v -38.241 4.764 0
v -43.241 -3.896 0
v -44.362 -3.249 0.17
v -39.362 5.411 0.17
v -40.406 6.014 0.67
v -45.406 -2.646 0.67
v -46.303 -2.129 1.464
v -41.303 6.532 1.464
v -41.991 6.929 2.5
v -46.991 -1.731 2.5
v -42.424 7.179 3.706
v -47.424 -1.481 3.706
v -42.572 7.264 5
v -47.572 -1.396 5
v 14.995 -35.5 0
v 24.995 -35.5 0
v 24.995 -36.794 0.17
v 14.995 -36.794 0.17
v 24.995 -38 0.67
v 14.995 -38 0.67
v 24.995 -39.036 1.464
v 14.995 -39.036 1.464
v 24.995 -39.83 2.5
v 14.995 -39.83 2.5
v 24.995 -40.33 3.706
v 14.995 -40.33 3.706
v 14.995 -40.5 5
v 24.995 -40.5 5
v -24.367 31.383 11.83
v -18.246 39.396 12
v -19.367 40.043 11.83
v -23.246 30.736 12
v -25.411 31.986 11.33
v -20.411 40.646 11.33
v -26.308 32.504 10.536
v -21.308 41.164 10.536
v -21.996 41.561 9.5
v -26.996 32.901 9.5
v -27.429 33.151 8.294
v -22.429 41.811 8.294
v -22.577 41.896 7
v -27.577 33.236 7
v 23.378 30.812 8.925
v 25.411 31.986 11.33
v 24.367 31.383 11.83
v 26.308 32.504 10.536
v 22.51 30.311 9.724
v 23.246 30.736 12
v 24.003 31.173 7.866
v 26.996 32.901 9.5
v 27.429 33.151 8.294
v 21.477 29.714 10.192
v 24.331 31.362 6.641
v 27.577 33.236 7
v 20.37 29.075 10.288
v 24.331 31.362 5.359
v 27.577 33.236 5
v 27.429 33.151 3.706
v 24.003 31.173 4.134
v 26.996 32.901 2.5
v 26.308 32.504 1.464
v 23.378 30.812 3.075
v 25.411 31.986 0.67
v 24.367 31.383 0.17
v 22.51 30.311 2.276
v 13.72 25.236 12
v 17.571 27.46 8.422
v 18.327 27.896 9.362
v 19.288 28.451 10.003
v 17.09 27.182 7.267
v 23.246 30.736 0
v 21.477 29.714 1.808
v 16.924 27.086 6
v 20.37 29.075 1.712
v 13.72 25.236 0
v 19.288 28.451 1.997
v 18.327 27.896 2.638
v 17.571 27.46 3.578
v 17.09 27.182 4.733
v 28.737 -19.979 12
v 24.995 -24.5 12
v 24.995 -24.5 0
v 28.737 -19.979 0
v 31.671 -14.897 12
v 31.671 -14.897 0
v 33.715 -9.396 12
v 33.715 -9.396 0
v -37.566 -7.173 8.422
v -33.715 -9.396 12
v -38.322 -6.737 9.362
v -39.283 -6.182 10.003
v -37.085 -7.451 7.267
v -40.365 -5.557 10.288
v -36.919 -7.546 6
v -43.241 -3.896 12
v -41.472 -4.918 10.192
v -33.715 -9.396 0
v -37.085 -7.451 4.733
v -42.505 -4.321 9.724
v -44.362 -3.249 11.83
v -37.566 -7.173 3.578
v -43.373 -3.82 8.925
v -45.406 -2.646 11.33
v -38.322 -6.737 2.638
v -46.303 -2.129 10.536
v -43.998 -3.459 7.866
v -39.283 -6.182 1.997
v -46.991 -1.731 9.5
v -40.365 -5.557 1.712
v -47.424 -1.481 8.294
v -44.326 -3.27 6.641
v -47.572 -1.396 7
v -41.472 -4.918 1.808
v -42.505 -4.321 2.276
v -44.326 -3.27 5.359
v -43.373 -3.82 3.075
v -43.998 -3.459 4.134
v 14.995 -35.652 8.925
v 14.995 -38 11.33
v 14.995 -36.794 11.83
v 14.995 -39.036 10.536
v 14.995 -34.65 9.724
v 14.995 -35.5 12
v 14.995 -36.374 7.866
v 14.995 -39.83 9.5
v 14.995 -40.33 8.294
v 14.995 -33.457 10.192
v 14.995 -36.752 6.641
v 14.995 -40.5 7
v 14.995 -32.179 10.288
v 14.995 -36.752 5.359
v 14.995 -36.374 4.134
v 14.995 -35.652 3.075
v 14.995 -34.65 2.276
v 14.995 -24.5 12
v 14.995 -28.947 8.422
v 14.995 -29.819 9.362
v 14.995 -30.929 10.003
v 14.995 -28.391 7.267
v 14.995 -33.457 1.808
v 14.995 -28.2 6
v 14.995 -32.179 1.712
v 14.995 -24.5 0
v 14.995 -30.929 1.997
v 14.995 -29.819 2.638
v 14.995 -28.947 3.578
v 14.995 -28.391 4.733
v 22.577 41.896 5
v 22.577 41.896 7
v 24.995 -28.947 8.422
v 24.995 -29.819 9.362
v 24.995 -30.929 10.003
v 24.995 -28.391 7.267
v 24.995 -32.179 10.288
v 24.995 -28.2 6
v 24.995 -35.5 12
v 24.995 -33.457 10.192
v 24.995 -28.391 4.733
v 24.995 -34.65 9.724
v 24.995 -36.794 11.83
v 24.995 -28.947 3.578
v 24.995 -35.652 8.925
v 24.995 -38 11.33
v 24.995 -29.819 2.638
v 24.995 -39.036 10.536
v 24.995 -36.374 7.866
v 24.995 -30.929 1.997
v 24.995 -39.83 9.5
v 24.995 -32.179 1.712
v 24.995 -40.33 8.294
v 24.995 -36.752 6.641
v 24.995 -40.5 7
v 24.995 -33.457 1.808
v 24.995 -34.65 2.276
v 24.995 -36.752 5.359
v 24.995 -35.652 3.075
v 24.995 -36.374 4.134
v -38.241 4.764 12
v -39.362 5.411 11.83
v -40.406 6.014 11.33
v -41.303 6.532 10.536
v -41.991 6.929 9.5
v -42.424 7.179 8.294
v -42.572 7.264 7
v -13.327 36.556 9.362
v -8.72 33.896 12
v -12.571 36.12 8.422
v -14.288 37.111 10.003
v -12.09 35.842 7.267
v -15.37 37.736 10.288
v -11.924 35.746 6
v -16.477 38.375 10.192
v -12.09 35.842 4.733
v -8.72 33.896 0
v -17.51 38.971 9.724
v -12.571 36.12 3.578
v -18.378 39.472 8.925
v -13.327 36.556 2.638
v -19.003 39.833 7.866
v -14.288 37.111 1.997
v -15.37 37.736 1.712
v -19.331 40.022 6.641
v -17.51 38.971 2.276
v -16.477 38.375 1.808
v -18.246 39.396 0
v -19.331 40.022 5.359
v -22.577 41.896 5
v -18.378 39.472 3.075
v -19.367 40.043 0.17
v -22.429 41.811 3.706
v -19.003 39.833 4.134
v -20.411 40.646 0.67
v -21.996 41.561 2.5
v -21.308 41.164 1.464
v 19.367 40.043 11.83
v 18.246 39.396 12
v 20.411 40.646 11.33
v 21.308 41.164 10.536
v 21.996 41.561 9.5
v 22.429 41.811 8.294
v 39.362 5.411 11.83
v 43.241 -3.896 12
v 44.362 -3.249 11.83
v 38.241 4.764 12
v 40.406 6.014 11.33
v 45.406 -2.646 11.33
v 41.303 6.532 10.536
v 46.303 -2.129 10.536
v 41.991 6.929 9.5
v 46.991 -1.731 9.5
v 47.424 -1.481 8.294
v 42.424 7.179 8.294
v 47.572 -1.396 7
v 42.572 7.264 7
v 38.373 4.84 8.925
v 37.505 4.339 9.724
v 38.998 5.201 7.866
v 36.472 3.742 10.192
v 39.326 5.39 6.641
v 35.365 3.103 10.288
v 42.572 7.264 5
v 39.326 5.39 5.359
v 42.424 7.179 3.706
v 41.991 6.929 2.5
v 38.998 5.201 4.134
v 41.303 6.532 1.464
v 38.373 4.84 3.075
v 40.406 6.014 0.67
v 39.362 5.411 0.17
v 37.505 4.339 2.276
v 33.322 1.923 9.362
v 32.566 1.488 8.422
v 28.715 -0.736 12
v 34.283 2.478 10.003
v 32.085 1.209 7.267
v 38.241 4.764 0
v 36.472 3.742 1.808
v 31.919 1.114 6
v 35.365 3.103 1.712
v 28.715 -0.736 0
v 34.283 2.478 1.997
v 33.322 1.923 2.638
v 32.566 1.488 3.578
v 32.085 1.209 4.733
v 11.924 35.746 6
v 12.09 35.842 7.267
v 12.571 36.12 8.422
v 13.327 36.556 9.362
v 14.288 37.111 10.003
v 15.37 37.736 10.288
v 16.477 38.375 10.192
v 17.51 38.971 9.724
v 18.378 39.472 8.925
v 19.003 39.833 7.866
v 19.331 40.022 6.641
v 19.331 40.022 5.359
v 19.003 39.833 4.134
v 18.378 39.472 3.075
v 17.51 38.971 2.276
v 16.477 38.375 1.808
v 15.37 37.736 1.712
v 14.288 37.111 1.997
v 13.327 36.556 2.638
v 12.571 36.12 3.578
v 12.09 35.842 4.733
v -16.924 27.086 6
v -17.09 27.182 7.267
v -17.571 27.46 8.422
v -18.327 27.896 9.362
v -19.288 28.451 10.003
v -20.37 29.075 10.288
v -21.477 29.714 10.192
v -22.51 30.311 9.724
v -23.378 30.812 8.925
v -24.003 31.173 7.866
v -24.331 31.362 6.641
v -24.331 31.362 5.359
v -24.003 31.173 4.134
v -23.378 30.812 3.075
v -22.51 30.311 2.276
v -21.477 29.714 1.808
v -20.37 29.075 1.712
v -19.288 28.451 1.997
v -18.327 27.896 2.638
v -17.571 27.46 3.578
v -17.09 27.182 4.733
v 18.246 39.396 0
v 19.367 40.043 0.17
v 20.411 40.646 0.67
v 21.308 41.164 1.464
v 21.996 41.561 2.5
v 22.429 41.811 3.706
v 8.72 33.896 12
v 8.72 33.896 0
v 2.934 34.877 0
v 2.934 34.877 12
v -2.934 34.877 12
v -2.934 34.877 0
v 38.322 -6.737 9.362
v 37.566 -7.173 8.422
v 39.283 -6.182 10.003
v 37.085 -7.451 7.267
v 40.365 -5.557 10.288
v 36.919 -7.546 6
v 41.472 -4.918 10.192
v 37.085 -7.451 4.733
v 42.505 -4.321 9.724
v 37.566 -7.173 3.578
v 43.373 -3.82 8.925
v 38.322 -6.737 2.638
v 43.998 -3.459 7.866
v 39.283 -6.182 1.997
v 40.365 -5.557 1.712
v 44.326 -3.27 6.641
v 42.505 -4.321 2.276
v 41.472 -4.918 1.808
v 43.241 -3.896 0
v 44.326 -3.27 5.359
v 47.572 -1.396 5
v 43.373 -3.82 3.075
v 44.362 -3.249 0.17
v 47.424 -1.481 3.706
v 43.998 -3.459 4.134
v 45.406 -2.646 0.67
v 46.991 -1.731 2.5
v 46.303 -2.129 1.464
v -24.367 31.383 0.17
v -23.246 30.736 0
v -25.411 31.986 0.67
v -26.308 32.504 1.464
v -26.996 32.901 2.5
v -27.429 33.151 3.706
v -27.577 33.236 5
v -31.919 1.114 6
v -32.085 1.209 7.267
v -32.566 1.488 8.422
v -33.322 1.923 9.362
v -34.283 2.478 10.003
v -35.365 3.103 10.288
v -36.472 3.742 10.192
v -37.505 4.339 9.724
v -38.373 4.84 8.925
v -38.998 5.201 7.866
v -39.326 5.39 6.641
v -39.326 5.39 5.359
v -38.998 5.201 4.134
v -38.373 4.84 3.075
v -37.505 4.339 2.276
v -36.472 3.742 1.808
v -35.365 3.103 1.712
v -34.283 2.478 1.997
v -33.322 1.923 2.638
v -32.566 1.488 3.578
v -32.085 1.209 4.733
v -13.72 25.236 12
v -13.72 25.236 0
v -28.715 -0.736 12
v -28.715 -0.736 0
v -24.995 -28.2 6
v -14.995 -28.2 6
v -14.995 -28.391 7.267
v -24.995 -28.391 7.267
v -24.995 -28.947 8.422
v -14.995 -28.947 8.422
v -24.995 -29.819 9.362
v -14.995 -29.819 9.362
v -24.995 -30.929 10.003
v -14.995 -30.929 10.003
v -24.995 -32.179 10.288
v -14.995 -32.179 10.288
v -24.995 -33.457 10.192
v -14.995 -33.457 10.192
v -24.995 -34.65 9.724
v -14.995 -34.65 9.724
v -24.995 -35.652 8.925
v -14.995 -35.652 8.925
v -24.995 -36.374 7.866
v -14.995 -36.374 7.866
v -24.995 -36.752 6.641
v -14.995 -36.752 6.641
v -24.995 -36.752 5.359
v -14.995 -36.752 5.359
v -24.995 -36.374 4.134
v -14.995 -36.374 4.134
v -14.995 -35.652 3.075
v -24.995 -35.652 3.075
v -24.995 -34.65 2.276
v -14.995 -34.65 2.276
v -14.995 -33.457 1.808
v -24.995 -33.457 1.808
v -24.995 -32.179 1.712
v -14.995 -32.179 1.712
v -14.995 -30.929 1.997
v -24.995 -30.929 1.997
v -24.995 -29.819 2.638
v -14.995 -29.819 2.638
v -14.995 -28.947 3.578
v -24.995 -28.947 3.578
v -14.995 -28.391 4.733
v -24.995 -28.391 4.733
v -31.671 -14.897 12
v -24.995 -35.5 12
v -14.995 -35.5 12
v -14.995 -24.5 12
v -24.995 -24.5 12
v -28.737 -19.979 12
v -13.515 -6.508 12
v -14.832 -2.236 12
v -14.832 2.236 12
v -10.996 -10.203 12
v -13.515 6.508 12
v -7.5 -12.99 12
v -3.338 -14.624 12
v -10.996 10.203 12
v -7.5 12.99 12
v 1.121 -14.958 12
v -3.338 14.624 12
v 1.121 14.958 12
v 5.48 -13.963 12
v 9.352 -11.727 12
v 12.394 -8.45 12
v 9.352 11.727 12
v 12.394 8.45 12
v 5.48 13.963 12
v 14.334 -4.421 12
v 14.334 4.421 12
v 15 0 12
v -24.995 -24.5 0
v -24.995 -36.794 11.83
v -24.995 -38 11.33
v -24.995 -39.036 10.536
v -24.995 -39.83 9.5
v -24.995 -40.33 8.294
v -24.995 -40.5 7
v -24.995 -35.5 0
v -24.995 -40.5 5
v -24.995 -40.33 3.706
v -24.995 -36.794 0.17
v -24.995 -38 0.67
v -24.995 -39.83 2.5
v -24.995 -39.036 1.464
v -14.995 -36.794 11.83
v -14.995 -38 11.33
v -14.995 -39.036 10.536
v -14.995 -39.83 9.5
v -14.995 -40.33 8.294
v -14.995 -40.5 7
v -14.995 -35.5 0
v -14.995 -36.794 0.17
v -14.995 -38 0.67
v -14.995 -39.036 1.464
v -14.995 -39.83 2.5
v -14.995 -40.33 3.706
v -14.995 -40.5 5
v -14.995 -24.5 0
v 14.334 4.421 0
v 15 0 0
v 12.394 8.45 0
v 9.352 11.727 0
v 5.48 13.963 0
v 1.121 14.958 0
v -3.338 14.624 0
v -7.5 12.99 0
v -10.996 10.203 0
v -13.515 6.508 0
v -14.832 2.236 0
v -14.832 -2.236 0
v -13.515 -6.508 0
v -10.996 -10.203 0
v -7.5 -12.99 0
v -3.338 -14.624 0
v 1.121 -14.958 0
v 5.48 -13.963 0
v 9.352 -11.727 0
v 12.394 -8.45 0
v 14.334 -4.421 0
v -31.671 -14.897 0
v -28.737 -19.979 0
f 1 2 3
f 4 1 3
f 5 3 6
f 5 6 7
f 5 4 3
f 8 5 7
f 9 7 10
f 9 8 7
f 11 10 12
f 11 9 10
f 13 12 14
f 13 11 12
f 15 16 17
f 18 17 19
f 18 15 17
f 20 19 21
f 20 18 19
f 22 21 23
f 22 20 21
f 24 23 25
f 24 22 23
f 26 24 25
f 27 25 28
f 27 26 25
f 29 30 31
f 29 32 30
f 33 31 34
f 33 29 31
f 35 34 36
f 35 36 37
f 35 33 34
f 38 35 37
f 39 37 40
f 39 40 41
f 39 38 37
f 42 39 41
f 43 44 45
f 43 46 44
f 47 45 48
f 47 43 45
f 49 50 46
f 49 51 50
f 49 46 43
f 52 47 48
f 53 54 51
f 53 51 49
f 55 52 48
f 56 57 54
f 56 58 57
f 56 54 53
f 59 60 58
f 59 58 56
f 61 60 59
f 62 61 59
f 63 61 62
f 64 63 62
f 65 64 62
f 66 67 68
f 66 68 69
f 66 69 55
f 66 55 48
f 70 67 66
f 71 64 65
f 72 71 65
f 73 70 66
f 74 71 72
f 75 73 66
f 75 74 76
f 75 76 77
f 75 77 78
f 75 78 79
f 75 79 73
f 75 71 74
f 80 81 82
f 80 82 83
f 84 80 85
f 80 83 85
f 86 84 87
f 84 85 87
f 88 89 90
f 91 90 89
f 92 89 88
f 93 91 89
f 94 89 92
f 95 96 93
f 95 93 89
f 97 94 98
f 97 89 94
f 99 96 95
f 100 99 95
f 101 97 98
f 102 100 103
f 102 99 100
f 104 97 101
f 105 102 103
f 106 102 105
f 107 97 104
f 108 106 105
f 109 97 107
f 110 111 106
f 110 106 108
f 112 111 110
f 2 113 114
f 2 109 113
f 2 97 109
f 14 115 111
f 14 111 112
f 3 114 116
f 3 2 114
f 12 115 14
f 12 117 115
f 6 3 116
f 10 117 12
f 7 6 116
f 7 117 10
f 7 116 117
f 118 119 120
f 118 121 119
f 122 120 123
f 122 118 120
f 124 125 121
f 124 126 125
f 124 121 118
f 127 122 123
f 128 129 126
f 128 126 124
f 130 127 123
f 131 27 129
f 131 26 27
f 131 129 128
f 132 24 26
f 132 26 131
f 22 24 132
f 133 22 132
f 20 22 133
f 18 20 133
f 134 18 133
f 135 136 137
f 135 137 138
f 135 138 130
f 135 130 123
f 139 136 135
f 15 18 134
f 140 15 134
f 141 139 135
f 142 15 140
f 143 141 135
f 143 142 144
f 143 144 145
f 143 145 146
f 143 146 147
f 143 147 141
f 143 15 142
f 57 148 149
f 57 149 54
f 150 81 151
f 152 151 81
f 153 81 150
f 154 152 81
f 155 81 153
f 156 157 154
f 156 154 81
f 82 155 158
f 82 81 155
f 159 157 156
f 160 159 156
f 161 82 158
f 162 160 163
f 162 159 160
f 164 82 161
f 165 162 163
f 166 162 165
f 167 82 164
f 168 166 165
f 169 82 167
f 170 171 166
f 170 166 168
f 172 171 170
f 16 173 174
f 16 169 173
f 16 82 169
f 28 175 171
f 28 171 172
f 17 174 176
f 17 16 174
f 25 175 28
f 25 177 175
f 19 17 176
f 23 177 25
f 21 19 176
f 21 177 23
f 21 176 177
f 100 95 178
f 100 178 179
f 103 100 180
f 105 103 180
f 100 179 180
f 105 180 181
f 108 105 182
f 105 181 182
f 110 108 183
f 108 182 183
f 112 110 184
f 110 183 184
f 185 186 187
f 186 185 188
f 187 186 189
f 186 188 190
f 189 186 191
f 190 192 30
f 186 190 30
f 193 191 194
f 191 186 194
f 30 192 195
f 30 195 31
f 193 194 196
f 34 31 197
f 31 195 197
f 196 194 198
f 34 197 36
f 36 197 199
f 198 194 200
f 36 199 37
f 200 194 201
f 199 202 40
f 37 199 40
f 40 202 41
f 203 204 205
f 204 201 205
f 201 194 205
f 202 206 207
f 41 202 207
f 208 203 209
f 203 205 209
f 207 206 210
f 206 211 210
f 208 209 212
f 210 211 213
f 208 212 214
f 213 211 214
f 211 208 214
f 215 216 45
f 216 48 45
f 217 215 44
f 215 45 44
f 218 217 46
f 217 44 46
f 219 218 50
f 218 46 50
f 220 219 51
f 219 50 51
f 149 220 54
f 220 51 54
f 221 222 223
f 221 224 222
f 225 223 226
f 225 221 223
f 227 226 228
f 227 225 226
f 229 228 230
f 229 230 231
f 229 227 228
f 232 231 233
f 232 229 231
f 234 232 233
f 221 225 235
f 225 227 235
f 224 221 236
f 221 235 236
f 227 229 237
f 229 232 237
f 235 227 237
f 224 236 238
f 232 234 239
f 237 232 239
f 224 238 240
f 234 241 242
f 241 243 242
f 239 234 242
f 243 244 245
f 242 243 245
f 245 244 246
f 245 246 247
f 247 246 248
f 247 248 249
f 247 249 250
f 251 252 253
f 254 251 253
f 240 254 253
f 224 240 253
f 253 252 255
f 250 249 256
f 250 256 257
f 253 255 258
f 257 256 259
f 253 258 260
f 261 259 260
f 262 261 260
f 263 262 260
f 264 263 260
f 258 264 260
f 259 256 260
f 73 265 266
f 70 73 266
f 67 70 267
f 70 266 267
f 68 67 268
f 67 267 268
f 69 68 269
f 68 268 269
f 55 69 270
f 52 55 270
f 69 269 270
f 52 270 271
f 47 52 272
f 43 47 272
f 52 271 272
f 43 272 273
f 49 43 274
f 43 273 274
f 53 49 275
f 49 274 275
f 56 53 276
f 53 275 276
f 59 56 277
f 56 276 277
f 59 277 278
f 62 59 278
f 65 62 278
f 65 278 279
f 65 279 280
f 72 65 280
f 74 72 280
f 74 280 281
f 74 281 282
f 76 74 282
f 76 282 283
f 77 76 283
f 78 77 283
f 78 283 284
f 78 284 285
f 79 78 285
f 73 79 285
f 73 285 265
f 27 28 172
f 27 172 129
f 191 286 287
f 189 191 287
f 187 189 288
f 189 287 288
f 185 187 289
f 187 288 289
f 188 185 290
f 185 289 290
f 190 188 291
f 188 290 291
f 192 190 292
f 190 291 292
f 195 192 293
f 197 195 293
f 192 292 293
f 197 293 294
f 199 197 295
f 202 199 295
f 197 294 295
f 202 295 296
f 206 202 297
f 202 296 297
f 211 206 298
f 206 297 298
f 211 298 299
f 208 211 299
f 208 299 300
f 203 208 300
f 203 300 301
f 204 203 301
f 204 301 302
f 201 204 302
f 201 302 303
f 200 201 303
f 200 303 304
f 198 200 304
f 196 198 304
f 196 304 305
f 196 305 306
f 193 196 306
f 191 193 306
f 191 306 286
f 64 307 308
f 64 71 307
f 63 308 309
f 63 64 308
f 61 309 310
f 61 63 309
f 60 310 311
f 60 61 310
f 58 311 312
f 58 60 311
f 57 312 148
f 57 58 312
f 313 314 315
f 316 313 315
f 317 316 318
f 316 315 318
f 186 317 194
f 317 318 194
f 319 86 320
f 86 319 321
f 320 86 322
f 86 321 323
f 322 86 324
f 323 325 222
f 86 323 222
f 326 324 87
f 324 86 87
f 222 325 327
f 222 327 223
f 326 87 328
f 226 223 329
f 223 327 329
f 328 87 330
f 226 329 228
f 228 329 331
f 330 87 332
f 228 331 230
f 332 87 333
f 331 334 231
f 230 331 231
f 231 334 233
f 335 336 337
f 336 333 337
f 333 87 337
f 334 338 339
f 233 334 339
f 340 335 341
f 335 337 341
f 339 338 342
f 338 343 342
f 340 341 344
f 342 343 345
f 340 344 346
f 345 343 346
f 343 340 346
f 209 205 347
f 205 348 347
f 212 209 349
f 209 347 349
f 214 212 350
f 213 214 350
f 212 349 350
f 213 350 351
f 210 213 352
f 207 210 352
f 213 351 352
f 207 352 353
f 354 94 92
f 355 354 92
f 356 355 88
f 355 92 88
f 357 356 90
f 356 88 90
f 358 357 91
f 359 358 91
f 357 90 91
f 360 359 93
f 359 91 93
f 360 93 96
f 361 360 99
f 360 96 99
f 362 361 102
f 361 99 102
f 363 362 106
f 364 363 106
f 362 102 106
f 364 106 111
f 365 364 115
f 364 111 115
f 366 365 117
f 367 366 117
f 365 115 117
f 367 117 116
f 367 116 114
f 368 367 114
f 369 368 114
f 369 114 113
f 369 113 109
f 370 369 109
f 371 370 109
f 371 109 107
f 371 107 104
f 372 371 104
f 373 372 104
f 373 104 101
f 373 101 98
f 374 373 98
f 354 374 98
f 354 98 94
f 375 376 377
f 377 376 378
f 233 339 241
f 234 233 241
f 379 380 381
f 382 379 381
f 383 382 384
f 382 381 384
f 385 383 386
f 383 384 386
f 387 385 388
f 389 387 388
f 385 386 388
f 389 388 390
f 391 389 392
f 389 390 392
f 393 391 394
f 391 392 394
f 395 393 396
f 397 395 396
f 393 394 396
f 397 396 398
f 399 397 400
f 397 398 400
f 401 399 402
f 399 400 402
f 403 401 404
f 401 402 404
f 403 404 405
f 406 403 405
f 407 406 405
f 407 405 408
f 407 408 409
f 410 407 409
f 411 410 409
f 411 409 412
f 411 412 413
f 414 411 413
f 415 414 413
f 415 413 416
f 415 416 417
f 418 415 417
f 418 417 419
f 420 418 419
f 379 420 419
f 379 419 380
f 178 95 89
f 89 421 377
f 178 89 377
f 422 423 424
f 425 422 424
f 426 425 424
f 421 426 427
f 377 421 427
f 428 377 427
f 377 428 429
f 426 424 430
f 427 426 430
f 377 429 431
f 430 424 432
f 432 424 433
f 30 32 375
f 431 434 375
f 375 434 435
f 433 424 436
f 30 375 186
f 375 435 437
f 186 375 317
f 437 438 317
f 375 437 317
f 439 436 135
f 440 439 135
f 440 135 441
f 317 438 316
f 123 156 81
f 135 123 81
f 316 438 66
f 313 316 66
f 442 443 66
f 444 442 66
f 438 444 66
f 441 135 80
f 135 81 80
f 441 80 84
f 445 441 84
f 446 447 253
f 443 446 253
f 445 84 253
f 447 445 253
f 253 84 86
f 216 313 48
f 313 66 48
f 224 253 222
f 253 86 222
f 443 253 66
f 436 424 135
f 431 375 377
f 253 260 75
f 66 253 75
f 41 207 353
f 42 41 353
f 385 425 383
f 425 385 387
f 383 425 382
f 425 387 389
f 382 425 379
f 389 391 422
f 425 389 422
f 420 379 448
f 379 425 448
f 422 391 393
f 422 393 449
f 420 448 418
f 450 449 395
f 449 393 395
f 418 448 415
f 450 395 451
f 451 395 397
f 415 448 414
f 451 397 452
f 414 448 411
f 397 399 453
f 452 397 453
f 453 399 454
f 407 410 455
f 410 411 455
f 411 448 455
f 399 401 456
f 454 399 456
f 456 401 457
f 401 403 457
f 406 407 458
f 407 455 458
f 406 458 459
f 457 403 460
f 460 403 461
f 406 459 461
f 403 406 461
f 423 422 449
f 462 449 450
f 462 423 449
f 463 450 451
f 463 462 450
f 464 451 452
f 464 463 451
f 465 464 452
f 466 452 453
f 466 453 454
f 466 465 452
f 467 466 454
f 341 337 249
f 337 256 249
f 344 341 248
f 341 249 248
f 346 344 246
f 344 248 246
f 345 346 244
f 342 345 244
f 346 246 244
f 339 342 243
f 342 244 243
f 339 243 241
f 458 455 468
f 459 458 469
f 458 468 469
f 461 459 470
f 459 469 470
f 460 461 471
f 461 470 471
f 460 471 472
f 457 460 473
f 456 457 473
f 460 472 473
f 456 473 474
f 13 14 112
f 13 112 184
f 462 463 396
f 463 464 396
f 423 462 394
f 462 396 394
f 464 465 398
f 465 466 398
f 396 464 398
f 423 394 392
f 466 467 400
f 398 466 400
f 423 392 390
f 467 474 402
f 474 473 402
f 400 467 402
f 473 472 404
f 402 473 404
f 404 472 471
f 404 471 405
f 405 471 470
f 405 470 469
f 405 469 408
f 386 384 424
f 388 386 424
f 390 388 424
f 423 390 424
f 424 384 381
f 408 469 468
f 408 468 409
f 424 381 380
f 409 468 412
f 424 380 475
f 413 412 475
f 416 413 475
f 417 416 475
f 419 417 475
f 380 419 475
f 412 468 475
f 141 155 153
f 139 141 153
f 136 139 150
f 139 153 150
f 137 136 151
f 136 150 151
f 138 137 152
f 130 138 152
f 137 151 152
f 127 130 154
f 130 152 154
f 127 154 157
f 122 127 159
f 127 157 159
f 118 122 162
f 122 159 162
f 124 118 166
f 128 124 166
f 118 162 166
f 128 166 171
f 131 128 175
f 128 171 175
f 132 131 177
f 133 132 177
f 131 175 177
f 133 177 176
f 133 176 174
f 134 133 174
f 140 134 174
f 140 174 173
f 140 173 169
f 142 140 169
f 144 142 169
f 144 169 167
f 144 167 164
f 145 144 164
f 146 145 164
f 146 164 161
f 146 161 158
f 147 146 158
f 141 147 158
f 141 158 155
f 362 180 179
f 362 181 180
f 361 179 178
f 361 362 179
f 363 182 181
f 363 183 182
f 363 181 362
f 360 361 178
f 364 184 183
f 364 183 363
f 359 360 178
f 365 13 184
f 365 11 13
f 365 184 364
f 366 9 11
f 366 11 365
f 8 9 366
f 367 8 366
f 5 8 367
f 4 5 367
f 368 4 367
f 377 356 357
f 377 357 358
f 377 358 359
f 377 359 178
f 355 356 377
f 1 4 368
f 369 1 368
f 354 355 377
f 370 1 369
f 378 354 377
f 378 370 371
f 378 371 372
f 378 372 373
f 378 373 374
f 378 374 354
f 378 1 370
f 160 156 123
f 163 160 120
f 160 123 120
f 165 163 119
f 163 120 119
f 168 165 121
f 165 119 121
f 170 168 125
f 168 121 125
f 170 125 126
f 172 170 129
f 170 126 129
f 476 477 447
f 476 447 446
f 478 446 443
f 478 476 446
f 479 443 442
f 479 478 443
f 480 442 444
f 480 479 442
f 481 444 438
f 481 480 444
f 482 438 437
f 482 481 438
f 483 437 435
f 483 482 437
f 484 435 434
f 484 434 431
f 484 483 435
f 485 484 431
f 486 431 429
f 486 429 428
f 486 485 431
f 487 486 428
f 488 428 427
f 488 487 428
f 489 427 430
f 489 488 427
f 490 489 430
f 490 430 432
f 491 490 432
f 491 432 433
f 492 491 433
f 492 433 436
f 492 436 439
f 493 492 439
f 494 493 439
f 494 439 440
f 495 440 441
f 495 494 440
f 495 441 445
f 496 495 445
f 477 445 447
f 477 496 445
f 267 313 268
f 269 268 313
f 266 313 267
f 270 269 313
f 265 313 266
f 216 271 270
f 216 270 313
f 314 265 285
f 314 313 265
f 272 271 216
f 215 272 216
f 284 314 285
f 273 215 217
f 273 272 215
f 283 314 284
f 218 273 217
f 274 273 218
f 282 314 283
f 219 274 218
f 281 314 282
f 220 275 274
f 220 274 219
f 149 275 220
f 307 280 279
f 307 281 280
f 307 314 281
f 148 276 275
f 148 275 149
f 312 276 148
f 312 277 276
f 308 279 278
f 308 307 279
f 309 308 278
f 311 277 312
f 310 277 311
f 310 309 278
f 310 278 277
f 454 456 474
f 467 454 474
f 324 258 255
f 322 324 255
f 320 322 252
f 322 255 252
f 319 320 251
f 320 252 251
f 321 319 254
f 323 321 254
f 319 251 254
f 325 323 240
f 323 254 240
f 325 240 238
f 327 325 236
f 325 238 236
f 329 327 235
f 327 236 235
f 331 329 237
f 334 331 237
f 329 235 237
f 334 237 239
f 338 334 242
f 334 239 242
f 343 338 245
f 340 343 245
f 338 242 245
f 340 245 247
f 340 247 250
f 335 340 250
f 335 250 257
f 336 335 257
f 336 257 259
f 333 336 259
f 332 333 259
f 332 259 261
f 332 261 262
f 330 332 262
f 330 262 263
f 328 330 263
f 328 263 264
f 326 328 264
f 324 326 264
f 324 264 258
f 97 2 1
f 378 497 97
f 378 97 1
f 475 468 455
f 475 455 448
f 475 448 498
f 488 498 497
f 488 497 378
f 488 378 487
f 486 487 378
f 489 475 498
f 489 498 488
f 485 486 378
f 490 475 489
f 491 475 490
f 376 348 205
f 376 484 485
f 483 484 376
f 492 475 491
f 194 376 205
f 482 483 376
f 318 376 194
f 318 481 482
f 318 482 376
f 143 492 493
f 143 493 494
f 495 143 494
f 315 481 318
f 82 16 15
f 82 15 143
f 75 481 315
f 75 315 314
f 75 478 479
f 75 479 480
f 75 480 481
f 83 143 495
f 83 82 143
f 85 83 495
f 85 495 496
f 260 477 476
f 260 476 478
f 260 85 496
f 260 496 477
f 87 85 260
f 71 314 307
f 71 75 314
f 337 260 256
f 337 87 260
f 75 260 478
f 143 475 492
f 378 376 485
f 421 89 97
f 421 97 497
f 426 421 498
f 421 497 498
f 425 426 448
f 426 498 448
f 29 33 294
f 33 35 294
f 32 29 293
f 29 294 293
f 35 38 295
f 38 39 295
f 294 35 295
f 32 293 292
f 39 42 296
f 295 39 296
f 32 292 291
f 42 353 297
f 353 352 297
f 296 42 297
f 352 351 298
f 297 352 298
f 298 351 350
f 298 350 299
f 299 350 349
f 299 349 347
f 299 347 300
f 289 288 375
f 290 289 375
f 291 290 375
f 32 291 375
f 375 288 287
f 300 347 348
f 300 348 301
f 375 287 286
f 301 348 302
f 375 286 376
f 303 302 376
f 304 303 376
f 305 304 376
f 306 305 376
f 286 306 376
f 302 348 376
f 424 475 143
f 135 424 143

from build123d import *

# Parameters (mm, degrees)
SKETCH1_R                = 15
BOSS_EXTRUDE1_DEPTH      = 12
BOSS_EXTRUDE2_DEPTH      = 12
SKETCH3_R                = 4.3
CUT_EXTRUDE1_DEPTH       = 79.135824623
FILLET1_R                = 5
CIRPATTERN1_COUNT        = 3
FILLET1_OF_CIRPATTERN1_R = 5


with BuildPart() as part:
    # Sketch1 → Boss-Extrude1 (new body)
    with BuildSketch(Plane.XY):
        with BuildLine():
            Line((-8.720122643, 33.896304534), (-33.715122143, -9.396304534))
            ThreePointArc((-33.715122143, -9.396304534), (-30.310889132, -17.5), (-24.9949995, -24.5))
            Line((-24.9949995, -24.5), (24.9949995, -24.5))
            ThreePointArc((24.9949995, -24.5), (30.310889132, -17.5), (33.715122143, -9.396304534))
            Line((33.715122143, -9.396304534), (8.720122643, 33.896304534))
            ThreePointArc((8.720122643, 33.896304534), (0, 35), (-8.720122643, 33.896304534))
        make_face()
        Circle(SKETCH1_R, mode=Mode.SUBTRACT)
    extrude(amount=BOSS_EXTRUDE1_DEPTH)

    # Sketch2 → Boss-Extrude2 (add)
    with BuildSketch(Plane(origin=(0, 0, 0), x_dir=(-1, 0, 0), z_dir=(0, 0, -1))):
        Polygon((33.715122143, -9.396304534), (47.571528603, -1.396304534), (42.571528603, 7.263949503), (28.715122143, -0.736050497), align=None)
        Polygon((13.720122643, 25.236050497), (8.720122643, 33.896304534), (22.576529103, 41.896304534), (27.576529103, 33.236050497), align=None)
    boss_extrude2 = extrude(amount=-BOSS_EXTRUDE2_DEPTH)

    # Sketch3 → Cut-Extrude1 (cut, through all)
    with BuildSketch(Plane(origin=(-12.49749975, -21.646304534, 0), x_dir=(0.866025404, -0.5, 0), z_dir=(-0.5, -0.866025404, 0))):
        with Locations((-32.5, 6)):
            Circle(SKETCH3_R)
    cut_extrude1 = extrude(amount=-CUT_EXTRUDE1_DEPTH, mode=Mode.SUBTRACT)

    # Fillet1
    fillet1_edges = [part.edges().sort_by_distance(p)[0] for p in [
        (-45.071528603, 2.933822484, 12),
        (-45.071528603, 2.933822484, 0),
        (-25.076529103, 37.566177516, 12),
        (-25.076529103, 37.566177516, 0),
    ]]
    fillet(fillet1_edges, radius=FILLET1_R)

    # CirPattern1: Boss-Extrude2, Cut-Extrude1 ×3 about axis
    cirpattern1_axis = Axis((0, 0, 0), (0, 0, 1))
    for i in range(1, CIRPATTERN1_COUNT):
        add(boss_extrude2.rotate(cirpattern1_axis, i * 360 / CIRPATTERN1_COUNT))
        add(cut_extrude1.rotate(cirpattern1_axis, i * 360 / CIRPATTERN1_COUNT), mode=Mode.SUBTRACT)

    # Fillet1 of CirPattern1
    fillet1_of_cirpattern1_edges = [part.edges().sort_by_distance(p)[0] for p in [
        (19.9949995, -40.5, 12),
        (19.9949995, -40.5, 0),
        (-19.9949995, -40.5, 12),
        (-19.9949995, -40.5, 0),
        (25.076529103, 37.566177516, 12),
        (25.076529103, 37.566177516, 0),
        (45.071528603, 2.933822484, 12),
        (45.071528603, 2.933822484, 0),
    ]]
    fillet(fillet1_of_cirpattern1_edges, radius=FILLET1_OF_CIRPATTERN1_R)


solid = part.part
